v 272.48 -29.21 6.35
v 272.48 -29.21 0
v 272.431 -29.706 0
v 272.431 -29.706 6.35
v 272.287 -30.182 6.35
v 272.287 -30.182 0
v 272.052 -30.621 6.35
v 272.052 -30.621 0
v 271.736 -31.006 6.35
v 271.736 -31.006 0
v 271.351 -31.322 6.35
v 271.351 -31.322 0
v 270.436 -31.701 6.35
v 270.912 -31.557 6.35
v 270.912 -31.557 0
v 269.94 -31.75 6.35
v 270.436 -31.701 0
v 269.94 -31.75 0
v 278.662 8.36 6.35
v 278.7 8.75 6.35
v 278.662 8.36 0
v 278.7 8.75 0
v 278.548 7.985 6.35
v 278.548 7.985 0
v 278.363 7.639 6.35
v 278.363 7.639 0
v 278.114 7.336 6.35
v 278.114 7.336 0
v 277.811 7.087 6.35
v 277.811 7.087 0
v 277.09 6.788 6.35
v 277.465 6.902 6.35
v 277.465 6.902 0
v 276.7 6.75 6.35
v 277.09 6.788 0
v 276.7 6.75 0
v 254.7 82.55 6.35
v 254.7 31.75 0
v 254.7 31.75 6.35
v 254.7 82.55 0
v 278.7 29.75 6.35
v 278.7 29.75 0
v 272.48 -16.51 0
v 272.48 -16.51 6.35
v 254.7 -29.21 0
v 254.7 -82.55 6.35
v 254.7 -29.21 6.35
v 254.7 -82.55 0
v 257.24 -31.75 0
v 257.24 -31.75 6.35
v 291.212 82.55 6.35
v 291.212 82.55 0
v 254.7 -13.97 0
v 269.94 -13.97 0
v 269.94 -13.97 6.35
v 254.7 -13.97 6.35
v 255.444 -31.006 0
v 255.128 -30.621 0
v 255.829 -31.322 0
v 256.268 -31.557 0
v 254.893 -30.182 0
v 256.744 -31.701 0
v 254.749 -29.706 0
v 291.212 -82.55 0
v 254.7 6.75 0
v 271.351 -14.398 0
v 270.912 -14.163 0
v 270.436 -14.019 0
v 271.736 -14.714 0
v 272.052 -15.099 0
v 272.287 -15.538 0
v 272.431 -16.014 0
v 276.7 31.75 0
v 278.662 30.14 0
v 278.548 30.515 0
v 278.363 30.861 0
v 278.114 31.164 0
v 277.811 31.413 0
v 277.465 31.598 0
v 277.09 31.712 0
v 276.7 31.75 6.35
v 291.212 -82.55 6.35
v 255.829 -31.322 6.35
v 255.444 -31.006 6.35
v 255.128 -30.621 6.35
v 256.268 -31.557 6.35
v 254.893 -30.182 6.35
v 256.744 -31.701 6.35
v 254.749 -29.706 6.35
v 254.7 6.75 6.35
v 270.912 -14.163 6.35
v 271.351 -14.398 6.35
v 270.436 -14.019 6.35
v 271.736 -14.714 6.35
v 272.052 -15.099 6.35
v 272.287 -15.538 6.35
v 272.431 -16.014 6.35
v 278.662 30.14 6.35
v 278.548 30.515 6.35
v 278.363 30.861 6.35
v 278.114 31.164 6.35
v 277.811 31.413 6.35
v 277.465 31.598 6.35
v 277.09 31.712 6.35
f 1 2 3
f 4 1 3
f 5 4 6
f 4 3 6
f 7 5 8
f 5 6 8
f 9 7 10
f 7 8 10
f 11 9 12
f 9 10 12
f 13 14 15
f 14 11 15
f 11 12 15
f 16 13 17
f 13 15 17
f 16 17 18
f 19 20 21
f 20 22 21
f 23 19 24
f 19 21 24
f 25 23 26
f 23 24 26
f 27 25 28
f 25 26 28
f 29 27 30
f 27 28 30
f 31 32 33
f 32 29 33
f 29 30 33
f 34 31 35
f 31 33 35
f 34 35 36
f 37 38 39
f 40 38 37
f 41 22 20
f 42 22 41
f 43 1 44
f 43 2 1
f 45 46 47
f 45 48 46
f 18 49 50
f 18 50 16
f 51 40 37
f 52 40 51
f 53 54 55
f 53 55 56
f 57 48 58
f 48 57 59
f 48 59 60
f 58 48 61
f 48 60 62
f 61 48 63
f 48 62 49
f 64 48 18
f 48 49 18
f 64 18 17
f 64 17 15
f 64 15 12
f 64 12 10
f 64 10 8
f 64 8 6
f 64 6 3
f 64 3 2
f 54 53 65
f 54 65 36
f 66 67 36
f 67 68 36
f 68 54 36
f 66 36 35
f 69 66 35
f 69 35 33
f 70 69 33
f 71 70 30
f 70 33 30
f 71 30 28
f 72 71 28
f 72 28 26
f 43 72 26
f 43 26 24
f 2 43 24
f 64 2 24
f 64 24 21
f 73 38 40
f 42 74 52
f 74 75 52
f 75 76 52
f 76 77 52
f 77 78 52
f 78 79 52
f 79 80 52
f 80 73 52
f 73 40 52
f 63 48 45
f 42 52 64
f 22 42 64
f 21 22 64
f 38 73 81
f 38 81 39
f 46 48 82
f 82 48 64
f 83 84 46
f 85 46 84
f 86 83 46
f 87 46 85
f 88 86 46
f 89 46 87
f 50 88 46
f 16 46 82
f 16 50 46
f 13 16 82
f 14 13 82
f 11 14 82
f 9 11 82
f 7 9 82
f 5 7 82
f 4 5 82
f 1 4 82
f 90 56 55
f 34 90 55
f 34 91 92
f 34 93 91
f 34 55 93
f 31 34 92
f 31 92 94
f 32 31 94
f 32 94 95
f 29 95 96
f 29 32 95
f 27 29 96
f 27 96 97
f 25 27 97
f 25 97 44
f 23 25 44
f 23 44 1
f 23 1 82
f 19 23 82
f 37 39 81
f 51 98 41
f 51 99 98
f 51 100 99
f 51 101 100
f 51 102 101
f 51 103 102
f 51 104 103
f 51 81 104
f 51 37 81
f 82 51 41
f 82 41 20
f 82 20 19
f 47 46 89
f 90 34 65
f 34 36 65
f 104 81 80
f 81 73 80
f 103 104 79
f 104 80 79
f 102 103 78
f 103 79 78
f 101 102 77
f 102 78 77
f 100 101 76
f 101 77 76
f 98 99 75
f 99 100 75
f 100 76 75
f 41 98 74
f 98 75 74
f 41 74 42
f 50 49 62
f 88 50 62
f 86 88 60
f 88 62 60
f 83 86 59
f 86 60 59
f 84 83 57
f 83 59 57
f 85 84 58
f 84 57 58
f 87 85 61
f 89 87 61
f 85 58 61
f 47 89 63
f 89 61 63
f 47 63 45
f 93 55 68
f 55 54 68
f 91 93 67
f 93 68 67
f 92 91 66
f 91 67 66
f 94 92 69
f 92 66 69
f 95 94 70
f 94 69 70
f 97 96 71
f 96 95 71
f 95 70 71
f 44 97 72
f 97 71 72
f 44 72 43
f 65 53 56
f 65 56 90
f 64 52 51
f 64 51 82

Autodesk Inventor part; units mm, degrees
ref_plane "YZ Plane" through (0, 0, 0) normal (1, 0, 0) x (0, 1, 0)
ref_plane "XZ Plane" through (0, 0, 0) normal (0, 1, 0) x (-1, 0, 0)
ref_plane "XY Plane" through (0, 0, 0) normal (0, 0, 1) x (1, 0, 0)
ref_plane "Work Plane1" through (0, 0, 0) normal (0, 0, 1) x (1, 0, 0)
sketch "Sketch1" plane through (0, 0, 0) normal (0, 0, 1) x (1, 0, 0)
  line L0 (254.7, -154.94) -> (254.7, 140.97) projected
  line L1 (291.2125, 168.0875) -> (291.2125, -168.0875) projected
  arc A0 (256.7, 31.75) -> (254.7, 29.75) centre (256.7, 29.75) ccw projected
  line L2 (254.7, 29.75) -> (254.7, 8.75) projected
  arc A1 (254.7, 8.75) -> (256.7, 6.75) centre (256.7, 8.75) ccw projected
  line L3 (256.7, 6.75) -> (276.7, 6.75) projected
  arc A2 (276.7, 6.75) -> (278.7, 8.75) centre (276.7, 8.75) ccw projected
  line L4 (278.7, 8.75) -> (278.7, 29.75) projected
  arc A3 (278.7, 29.75) -> (276.7, 31.75) centre (276.7, 29.75) ccw projected
  line L5 (276.7, 31.75) -> (256.7, 31.75) projected
  circle A4 centre (276.78, 8.75) radius 1.05 projected
  circle A5 centre (264.2, 8.75) radius 1.05 projected
  circle A6 centre (276.78, 29.75) radius 1.05 projected
  circle A7 centre (264.2, 29.75) radius 1.05 projected
  arc A8 (257.24, -13.97) -> (254.7, -16.51) centre (257.24, -16.51) ccw projected
  line L6 (254.7, -16.51) -> (254.7, -29.21) projected
  arc A9 (254.7, -29.21) -> (257.24, -31.75) centre (257.24, -29.21) ccw projected
  line L7 (257.24, -31.75) -> (269.94, -31.75) projected
  arc A10 (269.94, -31.75) -> (272.48, -29.21) centre (269.94, -29.21) ccw projected
  line L8 (272.48, -29.21) -> (272.48, -16.51) projected
  arc A11 (272.48, -16.51) -> (269.94, -13.97) centre (269.94, -16.51) ccw projected
  line L9 (269.94, -13.97) -> (257.24, -13.97) projected
  circle A12 centre (257.24, -19.05) radius 0.5 projected
  circle A13 centre (257.24, -24.13) radius 0.5 projected
  circle A14 centre (257.24, -29.21) radius 0.5 projected
  circle A15 centre (269.94, -29.21) radius 1.25 projected
  circle A16 centre (259.272, -18.923) radius 0.25 projected
  circle A17 centre (269.178, -19.304) radius 0.25 projected
  circle A18 centre (263.463, -28.702) radius 0.25 projected
  circle A19 centre (268.289, -26.67) radius 0.25 projected
  circle A20 centre (267.654, -30.861) radius 0.25 projected
  circle A21 centre (260.669, -26.797) radius 0.25 projected
  circle A22 centre (265.622, -26.035) radius 0.25 projected
  circle A23 centre (267.654, -21.717) radius 0.25 projected
  circle A24 centre (260.796, -21.971) radius 0.25 projected
  circle A25 centre (269.94, -16.51) radius 1.25 projected
  circle A26 centre (257.24, -26.67) radius 0.5 projected
  circle A27 centre (257.24, -21.59) radius 0.5 projected
  circle A28 centre (257.24, -16.51) radius 0.5 projected
  line L10 (254.7, 31.75) -> (254.7, 82.55)
  line L11 (254.7, 82.55) -> (291.2125, 82.55)
  line L12 (254.7, 31.75) -> (256.7, 31.75)
  line L13 (256.7, 6.75) -> (254.7, 6.75)
  line L14 (257.24, -13.97) -> (254.7, -13.97)
  line L15 (257.175, -31.75) -> (254.7, -31.75)
  line L16 (254.7, -31.75) -> (254.7, -82.55)
  line L17 (254.7, -82.55) -> (291.2125, -82.55)
  point P0 (0, 0)
  dimension "d0" = 50.8
  dimension "d1" = 50.8
extrude "Extrusion1" add sketch "Sketch1" along normal blind 6.35 contours L0 L15 A9 L7 A10 L8 A11 L9 L14 L13 L3 A2 L4 A3 L5 L12 L11 L1 L17 | L0 A9 L15
